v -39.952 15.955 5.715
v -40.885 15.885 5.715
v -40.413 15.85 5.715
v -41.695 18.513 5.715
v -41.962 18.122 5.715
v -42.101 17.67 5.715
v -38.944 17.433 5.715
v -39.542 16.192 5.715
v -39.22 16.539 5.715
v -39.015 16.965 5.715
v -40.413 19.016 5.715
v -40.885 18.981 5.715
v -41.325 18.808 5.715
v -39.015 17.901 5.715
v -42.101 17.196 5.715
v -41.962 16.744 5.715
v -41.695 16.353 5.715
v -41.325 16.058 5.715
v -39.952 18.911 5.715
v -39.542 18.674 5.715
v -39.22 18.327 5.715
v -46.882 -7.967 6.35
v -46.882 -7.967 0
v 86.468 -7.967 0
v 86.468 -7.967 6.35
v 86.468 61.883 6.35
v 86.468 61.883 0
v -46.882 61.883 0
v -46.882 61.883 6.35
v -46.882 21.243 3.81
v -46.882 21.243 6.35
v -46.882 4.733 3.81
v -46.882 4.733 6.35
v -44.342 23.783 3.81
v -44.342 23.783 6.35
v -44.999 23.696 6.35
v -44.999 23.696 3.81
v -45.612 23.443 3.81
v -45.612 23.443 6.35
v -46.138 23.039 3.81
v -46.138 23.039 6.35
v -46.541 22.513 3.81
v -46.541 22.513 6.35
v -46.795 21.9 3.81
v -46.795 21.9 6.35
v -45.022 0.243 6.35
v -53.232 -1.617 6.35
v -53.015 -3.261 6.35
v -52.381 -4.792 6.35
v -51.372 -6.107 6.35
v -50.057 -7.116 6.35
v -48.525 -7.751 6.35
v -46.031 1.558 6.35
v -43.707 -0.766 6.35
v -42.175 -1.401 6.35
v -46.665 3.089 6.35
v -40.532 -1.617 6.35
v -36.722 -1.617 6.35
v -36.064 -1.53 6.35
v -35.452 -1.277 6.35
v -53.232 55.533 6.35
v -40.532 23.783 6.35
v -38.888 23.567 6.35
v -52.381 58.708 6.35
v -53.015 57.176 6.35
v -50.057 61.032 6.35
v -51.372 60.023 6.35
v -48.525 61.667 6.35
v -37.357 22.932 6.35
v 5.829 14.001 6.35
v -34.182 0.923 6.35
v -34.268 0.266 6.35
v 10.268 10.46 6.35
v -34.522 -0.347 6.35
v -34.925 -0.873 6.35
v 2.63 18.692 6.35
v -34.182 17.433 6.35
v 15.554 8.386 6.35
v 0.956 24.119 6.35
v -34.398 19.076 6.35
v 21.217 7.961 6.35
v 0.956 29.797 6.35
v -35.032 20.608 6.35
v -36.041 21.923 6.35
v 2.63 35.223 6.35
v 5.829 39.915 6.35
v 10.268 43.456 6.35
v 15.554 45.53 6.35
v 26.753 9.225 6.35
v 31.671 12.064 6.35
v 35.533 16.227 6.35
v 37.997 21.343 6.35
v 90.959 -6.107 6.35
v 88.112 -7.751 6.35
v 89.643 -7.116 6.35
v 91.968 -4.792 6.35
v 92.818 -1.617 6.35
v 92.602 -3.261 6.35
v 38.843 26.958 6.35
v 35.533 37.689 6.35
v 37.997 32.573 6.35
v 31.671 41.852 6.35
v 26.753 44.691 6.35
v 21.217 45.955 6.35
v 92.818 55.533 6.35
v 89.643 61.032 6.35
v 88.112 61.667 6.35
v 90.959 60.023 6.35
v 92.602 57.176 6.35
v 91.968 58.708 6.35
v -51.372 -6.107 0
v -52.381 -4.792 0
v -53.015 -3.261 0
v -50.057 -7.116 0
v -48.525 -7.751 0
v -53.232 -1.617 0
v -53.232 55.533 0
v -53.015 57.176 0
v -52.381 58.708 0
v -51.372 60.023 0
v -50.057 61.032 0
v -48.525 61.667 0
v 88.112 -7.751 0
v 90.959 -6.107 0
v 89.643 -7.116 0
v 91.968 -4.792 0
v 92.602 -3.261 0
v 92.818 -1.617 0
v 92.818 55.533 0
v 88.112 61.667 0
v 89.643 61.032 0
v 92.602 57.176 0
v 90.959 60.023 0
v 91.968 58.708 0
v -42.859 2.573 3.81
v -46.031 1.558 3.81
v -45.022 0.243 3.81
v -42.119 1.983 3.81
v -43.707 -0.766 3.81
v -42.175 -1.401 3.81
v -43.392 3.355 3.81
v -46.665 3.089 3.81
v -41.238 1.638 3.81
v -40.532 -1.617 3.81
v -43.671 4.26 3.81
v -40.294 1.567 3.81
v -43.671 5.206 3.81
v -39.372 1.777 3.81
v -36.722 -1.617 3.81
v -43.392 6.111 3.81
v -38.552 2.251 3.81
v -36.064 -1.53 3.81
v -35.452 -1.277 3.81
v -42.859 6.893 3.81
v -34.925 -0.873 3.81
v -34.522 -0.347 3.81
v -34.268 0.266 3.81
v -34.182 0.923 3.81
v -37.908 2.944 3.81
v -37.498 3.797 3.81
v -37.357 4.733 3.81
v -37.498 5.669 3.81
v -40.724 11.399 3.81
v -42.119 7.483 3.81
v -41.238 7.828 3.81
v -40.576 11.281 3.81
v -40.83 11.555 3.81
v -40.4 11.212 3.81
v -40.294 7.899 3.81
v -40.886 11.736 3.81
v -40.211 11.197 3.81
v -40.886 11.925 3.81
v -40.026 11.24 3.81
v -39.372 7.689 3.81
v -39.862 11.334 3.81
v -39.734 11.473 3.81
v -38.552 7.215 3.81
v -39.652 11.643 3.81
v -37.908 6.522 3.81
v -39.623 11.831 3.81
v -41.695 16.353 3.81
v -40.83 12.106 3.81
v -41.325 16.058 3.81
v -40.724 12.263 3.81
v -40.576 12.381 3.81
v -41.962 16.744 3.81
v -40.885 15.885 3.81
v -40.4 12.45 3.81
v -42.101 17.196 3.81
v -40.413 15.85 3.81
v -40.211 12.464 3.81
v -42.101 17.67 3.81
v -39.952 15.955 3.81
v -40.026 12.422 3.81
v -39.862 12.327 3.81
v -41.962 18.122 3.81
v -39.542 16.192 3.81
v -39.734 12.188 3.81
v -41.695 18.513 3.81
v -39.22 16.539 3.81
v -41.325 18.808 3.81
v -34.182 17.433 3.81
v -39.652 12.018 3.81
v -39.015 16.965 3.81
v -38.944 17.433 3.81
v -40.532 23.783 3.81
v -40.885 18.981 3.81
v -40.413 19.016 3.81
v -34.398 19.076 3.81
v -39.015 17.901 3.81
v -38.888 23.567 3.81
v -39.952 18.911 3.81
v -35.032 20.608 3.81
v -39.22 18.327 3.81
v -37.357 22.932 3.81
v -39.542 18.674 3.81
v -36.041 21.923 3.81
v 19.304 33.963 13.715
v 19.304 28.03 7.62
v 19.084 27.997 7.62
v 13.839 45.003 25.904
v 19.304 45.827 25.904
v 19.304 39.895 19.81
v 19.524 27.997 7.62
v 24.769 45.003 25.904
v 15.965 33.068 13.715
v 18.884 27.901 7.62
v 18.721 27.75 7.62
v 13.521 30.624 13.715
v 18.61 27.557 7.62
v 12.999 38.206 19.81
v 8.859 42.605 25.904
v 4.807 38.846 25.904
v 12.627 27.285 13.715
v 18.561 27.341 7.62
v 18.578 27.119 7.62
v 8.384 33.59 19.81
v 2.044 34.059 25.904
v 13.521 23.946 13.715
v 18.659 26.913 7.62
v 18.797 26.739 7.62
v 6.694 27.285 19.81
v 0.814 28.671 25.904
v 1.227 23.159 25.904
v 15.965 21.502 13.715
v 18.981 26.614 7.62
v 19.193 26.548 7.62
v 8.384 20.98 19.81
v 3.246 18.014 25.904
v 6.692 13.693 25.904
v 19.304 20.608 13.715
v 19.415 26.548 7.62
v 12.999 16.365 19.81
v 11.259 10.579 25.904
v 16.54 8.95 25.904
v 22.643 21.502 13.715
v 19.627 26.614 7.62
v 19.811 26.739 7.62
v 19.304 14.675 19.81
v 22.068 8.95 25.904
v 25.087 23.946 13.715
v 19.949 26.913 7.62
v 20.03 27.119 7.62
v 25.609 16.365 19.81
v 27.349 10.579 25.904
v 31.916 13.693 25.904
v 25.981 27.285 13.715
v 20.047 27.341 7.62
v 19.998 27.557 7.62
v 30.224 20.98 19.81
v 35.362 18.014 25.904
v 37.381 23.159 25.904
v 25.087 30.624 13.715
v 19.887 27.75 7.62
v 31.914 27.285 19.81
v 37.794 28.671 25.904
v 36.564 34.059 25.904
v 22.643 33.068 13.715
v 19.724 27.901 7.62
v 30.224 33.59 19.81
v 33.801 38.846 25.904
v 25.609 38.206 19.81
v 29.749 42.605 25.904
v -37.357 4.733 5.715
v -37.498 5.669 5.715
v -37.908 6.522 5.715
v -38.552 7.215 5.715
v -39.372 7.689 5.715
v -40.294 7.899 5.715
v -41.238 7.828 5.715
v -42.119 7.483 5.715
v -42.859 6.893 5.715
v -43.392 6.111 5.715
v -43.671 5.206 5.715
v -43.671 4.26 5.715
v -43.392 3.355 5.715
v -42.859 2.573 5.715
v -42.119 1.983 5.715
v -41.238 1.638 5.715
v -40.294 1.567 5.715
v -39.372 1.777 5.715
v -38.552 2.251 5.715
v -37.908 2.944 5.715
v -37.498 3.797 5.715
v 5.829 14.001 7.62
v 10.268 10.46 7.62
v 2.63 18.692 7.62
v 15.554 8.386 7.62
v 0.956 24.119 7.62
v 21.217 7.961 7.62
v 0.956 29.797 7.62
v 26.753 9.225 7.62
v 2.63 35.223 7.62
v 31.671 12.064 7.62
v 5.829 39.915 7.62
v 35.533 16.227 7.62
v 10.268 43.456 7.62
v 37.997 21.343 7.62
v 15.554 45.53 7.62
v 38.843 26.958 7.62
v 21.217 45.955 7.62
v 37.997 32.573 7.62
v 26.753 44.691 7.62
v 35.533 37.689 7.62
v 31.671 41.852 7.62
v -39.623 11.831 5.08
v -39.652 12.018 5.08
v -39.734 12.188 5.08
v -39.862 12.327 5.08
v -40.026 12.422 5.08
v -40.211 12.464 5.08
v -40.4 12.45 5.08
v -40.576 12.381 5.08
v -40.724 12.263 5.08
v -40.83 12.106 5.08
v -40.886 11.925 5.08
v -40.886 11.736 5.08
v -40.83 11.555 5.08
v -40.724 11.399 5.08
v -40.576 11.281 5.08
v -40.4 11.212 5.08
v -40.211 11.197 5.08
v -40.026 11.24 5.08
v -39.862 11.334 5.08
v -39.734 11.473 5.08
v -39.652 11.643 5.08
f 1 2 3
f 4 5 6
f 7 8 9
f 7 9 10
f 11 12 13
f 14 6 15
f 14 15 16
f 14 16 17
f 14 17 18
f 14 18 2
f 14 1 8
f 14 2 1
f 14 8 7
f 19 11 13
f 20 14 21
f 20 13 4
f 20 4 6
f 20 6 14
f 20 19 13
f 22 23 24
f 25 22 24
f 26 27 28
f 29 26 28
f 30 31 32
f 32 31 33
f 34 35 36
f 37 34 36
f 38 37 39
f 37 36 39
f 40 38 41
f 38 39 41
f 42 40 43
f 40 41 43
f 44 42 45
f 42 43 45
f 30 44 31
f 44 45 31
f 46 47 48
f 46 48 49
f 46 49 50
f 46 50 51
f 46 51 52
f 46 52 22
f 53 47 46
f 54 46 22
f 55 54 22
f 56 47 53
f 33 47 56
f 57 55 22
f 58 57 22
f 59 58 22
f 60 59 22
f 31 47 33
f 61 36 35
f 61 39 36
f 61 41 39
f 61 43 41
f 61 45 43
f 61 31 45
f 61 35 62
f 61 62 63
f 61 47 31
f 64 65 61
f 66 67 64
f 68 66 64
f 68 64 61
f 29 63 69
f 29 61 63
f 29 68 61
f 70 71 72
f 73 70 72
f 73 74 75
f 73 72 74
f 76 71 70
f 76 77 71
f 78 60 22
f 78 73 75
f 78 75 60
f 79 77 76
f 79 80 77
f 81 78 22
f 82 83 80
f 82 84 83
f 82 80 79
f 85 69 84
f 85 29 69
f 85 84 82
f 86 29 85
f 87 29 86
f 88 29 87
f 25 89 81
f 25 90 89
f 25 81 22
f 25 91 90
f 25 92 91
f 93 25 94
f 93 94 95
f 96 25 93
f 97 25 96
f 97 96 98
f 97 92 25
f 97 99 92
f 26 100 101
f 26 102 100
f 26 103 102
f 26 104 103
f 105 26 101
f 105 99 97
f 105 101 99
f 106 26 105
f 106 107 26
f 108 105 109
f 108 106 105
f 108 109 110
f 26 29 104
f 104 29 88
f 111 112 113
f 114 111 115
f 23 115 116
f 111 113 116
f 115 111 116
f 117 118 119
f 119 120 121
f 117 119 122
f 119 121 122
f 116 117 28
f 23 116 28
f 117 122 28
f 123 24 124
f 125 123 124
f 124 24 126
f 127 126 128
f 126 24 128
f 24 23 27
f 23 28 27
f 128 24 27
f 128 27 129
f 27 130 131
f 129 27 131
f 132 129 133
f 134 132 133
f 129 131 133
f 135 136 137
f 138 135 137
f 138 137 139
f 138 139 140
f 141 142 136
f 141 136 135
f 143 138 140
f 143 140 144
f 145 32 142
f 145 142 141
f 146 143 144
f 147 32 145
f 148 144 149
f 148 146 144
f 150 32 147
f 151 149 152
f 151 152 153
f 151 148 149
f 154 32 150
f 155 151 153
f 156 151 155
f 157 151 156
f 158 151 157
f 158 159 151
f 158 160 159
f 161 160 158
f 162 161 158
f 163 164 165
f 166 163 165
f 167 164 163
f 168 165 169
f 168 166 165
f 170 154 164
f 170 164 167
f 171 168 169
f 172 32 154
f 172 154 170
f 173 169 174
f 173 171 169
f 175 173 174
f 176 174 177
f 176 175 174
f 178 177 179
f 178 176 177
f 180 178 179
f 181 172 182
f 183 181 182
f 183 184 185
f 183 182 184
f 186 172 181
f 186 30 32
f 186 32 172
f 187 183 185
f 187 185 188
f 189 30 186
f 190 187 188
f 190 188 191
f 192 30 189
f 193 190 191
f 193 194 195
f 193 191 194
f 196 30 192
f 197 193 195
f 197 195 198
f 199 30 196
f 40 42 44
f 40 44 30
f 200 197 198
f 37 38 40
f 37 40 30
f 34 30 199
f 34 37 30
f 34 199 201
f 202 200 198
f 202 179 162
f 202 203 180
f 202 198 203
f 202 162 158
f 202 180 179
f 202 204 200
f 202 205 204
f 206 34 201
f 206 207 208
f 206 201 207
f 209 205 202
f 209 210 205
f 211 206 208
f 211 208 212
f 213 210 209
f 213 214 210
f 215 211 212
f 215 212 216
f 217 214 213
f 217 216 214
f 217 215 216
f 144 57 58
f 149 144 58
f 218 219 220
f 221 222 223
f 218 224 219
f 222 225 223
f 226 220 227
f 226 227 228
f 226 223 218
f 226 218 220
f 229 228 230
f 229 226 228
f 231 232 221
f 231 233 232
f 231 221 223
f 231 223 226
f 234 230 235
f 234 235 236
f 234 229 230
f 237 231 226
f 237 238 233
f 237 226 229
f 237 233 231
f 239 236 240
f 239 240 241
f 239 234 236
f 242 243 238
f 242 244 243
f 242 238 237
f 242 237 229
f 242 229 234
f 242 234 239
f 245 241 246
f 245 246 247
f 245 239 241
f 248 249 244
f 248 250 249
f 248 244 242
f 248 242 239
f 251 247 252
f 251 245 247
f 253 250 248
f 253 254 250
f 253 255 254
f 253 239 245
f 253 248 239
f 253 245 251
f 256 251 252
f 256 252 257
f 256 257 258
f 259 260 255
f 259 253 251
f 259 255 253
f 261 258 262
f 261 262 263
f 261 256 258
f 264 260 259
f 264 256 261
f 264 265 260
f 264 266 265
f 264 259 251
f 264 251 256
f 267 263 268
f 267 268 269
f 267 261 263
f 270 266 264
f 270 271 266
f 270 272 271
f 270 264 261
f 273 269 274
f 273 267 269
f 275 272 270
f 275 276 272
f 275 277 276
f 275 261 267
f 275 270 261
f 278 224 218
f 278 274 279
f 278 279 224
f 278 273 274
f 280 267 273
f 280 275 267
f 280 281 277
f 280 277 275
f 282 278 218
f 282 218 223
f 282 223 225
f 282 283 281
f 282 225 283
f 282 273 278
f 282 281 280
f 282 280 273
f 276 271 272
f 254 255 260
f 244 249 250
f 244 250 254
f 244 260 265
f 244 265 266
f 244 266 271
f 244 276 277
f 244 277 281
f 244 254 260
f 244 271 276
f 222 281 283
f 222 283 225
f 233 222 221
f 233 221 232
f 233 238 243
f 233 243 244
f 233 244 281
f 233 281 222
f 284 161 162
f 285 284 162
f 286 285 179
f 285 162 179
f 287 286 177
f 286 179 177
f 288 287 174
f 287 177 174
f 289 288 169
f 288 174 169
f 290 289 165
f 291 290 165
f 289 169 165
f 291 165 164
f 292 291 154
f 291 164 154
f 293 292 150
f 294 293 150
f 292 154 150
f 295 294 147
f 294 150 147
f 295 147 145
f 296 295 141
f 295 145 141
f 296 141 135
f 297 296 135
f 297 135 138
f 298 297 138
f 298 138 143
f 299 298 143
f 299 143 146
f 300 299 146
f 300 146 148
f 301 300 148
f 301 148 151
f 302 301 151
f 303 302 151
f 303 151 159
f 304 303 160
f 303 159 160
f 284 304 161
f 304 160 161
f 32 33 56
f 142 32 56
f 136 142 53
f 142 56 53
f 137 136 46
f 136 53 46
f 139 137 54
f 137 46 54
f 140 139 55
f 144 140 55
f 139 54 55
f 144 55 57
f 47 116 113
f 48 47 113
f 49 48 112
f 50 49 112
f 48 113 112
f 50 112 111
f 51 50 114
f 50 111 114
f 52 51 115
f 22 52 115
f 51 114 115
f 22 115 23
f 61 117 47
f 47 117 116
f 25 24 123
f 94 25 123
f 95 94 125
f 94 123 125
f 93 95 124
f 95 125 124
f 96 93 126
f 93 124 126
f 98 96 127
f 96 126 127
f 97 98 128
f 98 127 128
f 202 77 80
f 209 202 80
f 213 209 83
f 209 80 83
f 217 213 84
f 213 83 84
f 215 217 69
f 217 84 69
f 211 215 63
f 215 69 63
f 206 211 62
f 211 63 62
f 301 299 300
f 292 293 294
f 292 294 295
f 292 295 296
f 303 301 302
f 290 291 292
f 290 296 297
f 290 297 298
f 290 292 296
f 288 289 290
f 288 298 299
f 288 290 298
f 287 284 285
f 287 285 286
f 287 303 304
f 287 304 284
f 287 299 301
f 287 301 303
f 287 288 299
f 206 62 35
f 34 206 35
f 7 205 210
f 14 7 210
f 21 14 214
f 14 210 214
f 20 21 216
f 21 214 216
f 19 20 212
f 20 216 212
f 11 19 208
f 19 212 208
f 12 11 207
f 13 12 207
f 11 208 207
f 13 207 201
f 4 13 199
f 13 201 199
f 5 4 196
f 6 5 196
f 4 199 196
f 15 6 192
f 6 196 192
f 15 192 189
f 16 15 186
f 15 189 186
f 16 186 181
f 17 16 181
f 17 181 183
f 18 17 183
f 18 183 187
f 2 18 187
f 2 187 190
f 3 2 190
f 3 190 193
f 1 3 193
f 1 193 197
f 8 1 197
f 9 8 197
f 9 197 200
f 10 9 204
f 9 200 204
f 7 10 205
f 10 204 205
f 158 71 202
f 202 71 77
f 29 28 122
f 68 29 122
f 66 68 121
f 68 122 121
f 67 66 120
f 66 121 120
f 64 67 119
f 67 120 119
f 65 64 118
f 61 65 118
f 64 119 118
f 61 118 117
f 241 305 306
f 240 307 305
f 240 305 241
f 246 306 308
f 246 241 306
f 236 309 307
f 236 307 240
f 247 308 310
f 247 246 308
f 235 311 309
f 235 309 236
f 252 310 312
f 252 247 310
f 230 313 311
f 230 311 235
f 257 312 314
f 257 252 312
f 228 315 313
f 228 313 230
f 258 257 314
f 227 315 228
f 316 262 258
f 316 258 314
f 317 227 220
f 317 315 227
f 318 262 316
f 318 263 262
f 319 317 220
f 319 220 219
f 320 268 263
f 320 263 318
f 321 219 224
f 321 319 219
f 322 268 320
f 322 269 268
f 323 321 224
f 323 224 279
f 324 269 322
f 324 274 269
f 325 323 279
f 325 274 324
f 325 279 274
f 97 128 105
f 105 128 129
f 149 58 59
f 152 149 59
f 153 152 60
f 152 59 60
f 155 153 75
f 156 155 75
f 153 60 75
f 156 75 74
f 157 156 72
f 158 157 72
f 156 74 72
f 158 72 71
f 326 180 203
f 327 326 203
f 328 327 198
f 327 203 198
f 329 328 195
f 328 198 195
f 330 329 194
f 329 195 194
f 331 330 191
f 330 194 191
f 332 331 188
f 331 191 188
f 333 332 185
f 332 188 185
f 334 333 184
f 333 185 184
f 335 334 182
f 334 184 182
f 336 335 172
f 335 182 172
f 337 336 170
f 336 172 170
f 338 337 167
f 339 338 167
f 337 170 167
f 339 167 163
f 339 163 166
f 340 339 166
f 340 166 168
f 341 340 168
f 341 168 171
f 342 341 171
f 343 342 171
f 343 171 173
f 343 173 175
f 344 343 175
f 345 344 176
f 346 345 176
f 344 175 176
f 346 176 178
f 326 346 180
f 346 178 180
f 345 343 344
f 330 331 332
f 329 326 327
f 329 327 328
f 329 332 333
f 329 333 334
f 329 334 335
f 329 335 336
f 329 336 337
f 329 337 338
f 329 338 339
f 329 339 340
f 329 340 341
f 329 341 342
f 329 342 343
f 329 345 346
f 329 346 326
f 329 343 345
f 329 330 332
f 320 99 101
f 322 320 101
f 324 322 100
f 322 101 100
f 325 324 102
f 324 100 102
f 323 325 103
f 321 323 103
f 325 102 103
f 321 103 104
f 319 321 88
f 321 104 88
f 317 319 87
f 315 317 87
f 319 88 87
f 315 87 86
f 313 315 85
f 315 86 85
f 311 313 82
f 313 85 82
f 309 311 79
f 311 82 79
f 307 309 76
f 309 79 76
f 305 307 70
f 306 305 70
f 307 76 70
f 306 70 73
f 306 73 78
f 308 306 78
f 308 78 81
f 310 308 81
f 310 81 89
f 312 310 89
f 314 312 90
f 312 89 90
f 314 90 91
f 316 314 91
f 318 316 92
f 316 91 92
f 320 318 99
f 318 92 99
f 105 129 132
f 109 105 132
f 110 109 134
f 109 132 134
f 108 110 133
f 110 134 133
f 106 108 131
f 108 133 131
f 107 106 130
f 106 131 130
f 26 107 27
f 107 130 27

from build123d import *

# Parameters (mm, degrees)
F1_DEPTH = 6.35
F3_DEPTH = 2.54
F4_R     = 3.175
F4_R_2   = 1.5875
F5_DEPTH = 1.905
F6_R     = 0.635
F7_DEPTH = 1.27
F8_R     = 19.05
F9_DEPTH = 1.27


with BuildPart() as f1:
    # F0 (on Top) → F1 (new body)
    with BuildSketch(Plane.XY):
        with BuildLine():
            Line((86.468494, 61.882985), (-46.881506, 61.882985))
            ThreePointArc((-46.881506, 61.882985), (-51.371634, 60.023113), (-53.231506, 55.532985))
            Line((-53.231506, 55.532985), (-53.231506, -1.617015))
            ThreePointArc((-53.231506, -1.617015), (-51.371634, -6.107143), (-46.881506, -7.967015))
            Line((-46.881506, -7.967015), (86.468494, -7.967015))
            ThreePointArc((86.468494, -7.967015), (90.958622, -6.107143), (92.818494, -1.617015))
            Line((92.818494, -1.617015), (92.818494, 55.532985))
            ThreePointArc((92.818494, 55.532985), (90.958622, 60.023113), (86.468494, 61.882985))
        make_face()
    extrude(amount=F1_DEPTH)

    # F2 (on face) → F3 (cut)
    with BuildSketch(Plane.XY.offset(6.35)):
        with BuildLine():
            ThreePointArc((-46.881506, 4.732985), (-45.021634, 0.242857), (-40.531506, -1.617015))
            Line((-40.531506, -1.617015), (-36.721506, -1.617015))
            ThreePointArc((-36.721506, -1.617015), (-34.925455, -0.873067), (-34.181506, 0.922985))
            Line((-34.181506, 0.922985), (-34.181506, 17.432985))
            ThreePointArc((-34.181506, 17.432985), (-36.041378, 21.923113), (-40.531506, 23.782985))
            Line((-40.531506, 23.782985), (-44.341506, 23.782985))
            ThreePointArc((-44.341506, 23.782985), (-46.137557, 23.039036), (-46.881506, 21.242985))
            Line((-46.881506, 21.242985), (-46.881506, 4.732985))
        make_face()
    extrude(amount=-F3_DEPTH, mode=Mode.SUBTRACT)

    # F4 (on face) → F5 (join)
    with BuildSketch(Plane.XY.offset(3.81)):
        with Locations((-40.531506, 4.732985)):
            Circle(F4_R)
        with Locations((-40.531506, 17.432985)):
            Circle(F4_R_2)
    extrude(amount=F5_DEPTH)

    # F6 (on face) → F7 (join)
    with BuildSketch(Plane.XY.offset(3.81)):
        with Locations((-40.258363, 11.830621)):
            Circle(F6_R)
    extrude(amount=F7_DEPTH)

    # F8 (on face) → F9 (join)
    with BuildSketch(Plane.XY.offset(6.35)):
        with Locations((19.793494, 26.957985)):
            Circle(F8_R)
    extrude(amount=F9_DEPTH)

    # F11 (on offset) → F12 (revolve)
    with BuildSketch(Plane.YZ.offset(19.304)):
        Polygon((27.2852, 25.904429), (27.2852, 6.854429), (45.8272, 25.904429), align=None)
    revolve(axis=Axis((19.304, 27.2852, 16.379429), (0, 0, 1)))


solid = f1.part
